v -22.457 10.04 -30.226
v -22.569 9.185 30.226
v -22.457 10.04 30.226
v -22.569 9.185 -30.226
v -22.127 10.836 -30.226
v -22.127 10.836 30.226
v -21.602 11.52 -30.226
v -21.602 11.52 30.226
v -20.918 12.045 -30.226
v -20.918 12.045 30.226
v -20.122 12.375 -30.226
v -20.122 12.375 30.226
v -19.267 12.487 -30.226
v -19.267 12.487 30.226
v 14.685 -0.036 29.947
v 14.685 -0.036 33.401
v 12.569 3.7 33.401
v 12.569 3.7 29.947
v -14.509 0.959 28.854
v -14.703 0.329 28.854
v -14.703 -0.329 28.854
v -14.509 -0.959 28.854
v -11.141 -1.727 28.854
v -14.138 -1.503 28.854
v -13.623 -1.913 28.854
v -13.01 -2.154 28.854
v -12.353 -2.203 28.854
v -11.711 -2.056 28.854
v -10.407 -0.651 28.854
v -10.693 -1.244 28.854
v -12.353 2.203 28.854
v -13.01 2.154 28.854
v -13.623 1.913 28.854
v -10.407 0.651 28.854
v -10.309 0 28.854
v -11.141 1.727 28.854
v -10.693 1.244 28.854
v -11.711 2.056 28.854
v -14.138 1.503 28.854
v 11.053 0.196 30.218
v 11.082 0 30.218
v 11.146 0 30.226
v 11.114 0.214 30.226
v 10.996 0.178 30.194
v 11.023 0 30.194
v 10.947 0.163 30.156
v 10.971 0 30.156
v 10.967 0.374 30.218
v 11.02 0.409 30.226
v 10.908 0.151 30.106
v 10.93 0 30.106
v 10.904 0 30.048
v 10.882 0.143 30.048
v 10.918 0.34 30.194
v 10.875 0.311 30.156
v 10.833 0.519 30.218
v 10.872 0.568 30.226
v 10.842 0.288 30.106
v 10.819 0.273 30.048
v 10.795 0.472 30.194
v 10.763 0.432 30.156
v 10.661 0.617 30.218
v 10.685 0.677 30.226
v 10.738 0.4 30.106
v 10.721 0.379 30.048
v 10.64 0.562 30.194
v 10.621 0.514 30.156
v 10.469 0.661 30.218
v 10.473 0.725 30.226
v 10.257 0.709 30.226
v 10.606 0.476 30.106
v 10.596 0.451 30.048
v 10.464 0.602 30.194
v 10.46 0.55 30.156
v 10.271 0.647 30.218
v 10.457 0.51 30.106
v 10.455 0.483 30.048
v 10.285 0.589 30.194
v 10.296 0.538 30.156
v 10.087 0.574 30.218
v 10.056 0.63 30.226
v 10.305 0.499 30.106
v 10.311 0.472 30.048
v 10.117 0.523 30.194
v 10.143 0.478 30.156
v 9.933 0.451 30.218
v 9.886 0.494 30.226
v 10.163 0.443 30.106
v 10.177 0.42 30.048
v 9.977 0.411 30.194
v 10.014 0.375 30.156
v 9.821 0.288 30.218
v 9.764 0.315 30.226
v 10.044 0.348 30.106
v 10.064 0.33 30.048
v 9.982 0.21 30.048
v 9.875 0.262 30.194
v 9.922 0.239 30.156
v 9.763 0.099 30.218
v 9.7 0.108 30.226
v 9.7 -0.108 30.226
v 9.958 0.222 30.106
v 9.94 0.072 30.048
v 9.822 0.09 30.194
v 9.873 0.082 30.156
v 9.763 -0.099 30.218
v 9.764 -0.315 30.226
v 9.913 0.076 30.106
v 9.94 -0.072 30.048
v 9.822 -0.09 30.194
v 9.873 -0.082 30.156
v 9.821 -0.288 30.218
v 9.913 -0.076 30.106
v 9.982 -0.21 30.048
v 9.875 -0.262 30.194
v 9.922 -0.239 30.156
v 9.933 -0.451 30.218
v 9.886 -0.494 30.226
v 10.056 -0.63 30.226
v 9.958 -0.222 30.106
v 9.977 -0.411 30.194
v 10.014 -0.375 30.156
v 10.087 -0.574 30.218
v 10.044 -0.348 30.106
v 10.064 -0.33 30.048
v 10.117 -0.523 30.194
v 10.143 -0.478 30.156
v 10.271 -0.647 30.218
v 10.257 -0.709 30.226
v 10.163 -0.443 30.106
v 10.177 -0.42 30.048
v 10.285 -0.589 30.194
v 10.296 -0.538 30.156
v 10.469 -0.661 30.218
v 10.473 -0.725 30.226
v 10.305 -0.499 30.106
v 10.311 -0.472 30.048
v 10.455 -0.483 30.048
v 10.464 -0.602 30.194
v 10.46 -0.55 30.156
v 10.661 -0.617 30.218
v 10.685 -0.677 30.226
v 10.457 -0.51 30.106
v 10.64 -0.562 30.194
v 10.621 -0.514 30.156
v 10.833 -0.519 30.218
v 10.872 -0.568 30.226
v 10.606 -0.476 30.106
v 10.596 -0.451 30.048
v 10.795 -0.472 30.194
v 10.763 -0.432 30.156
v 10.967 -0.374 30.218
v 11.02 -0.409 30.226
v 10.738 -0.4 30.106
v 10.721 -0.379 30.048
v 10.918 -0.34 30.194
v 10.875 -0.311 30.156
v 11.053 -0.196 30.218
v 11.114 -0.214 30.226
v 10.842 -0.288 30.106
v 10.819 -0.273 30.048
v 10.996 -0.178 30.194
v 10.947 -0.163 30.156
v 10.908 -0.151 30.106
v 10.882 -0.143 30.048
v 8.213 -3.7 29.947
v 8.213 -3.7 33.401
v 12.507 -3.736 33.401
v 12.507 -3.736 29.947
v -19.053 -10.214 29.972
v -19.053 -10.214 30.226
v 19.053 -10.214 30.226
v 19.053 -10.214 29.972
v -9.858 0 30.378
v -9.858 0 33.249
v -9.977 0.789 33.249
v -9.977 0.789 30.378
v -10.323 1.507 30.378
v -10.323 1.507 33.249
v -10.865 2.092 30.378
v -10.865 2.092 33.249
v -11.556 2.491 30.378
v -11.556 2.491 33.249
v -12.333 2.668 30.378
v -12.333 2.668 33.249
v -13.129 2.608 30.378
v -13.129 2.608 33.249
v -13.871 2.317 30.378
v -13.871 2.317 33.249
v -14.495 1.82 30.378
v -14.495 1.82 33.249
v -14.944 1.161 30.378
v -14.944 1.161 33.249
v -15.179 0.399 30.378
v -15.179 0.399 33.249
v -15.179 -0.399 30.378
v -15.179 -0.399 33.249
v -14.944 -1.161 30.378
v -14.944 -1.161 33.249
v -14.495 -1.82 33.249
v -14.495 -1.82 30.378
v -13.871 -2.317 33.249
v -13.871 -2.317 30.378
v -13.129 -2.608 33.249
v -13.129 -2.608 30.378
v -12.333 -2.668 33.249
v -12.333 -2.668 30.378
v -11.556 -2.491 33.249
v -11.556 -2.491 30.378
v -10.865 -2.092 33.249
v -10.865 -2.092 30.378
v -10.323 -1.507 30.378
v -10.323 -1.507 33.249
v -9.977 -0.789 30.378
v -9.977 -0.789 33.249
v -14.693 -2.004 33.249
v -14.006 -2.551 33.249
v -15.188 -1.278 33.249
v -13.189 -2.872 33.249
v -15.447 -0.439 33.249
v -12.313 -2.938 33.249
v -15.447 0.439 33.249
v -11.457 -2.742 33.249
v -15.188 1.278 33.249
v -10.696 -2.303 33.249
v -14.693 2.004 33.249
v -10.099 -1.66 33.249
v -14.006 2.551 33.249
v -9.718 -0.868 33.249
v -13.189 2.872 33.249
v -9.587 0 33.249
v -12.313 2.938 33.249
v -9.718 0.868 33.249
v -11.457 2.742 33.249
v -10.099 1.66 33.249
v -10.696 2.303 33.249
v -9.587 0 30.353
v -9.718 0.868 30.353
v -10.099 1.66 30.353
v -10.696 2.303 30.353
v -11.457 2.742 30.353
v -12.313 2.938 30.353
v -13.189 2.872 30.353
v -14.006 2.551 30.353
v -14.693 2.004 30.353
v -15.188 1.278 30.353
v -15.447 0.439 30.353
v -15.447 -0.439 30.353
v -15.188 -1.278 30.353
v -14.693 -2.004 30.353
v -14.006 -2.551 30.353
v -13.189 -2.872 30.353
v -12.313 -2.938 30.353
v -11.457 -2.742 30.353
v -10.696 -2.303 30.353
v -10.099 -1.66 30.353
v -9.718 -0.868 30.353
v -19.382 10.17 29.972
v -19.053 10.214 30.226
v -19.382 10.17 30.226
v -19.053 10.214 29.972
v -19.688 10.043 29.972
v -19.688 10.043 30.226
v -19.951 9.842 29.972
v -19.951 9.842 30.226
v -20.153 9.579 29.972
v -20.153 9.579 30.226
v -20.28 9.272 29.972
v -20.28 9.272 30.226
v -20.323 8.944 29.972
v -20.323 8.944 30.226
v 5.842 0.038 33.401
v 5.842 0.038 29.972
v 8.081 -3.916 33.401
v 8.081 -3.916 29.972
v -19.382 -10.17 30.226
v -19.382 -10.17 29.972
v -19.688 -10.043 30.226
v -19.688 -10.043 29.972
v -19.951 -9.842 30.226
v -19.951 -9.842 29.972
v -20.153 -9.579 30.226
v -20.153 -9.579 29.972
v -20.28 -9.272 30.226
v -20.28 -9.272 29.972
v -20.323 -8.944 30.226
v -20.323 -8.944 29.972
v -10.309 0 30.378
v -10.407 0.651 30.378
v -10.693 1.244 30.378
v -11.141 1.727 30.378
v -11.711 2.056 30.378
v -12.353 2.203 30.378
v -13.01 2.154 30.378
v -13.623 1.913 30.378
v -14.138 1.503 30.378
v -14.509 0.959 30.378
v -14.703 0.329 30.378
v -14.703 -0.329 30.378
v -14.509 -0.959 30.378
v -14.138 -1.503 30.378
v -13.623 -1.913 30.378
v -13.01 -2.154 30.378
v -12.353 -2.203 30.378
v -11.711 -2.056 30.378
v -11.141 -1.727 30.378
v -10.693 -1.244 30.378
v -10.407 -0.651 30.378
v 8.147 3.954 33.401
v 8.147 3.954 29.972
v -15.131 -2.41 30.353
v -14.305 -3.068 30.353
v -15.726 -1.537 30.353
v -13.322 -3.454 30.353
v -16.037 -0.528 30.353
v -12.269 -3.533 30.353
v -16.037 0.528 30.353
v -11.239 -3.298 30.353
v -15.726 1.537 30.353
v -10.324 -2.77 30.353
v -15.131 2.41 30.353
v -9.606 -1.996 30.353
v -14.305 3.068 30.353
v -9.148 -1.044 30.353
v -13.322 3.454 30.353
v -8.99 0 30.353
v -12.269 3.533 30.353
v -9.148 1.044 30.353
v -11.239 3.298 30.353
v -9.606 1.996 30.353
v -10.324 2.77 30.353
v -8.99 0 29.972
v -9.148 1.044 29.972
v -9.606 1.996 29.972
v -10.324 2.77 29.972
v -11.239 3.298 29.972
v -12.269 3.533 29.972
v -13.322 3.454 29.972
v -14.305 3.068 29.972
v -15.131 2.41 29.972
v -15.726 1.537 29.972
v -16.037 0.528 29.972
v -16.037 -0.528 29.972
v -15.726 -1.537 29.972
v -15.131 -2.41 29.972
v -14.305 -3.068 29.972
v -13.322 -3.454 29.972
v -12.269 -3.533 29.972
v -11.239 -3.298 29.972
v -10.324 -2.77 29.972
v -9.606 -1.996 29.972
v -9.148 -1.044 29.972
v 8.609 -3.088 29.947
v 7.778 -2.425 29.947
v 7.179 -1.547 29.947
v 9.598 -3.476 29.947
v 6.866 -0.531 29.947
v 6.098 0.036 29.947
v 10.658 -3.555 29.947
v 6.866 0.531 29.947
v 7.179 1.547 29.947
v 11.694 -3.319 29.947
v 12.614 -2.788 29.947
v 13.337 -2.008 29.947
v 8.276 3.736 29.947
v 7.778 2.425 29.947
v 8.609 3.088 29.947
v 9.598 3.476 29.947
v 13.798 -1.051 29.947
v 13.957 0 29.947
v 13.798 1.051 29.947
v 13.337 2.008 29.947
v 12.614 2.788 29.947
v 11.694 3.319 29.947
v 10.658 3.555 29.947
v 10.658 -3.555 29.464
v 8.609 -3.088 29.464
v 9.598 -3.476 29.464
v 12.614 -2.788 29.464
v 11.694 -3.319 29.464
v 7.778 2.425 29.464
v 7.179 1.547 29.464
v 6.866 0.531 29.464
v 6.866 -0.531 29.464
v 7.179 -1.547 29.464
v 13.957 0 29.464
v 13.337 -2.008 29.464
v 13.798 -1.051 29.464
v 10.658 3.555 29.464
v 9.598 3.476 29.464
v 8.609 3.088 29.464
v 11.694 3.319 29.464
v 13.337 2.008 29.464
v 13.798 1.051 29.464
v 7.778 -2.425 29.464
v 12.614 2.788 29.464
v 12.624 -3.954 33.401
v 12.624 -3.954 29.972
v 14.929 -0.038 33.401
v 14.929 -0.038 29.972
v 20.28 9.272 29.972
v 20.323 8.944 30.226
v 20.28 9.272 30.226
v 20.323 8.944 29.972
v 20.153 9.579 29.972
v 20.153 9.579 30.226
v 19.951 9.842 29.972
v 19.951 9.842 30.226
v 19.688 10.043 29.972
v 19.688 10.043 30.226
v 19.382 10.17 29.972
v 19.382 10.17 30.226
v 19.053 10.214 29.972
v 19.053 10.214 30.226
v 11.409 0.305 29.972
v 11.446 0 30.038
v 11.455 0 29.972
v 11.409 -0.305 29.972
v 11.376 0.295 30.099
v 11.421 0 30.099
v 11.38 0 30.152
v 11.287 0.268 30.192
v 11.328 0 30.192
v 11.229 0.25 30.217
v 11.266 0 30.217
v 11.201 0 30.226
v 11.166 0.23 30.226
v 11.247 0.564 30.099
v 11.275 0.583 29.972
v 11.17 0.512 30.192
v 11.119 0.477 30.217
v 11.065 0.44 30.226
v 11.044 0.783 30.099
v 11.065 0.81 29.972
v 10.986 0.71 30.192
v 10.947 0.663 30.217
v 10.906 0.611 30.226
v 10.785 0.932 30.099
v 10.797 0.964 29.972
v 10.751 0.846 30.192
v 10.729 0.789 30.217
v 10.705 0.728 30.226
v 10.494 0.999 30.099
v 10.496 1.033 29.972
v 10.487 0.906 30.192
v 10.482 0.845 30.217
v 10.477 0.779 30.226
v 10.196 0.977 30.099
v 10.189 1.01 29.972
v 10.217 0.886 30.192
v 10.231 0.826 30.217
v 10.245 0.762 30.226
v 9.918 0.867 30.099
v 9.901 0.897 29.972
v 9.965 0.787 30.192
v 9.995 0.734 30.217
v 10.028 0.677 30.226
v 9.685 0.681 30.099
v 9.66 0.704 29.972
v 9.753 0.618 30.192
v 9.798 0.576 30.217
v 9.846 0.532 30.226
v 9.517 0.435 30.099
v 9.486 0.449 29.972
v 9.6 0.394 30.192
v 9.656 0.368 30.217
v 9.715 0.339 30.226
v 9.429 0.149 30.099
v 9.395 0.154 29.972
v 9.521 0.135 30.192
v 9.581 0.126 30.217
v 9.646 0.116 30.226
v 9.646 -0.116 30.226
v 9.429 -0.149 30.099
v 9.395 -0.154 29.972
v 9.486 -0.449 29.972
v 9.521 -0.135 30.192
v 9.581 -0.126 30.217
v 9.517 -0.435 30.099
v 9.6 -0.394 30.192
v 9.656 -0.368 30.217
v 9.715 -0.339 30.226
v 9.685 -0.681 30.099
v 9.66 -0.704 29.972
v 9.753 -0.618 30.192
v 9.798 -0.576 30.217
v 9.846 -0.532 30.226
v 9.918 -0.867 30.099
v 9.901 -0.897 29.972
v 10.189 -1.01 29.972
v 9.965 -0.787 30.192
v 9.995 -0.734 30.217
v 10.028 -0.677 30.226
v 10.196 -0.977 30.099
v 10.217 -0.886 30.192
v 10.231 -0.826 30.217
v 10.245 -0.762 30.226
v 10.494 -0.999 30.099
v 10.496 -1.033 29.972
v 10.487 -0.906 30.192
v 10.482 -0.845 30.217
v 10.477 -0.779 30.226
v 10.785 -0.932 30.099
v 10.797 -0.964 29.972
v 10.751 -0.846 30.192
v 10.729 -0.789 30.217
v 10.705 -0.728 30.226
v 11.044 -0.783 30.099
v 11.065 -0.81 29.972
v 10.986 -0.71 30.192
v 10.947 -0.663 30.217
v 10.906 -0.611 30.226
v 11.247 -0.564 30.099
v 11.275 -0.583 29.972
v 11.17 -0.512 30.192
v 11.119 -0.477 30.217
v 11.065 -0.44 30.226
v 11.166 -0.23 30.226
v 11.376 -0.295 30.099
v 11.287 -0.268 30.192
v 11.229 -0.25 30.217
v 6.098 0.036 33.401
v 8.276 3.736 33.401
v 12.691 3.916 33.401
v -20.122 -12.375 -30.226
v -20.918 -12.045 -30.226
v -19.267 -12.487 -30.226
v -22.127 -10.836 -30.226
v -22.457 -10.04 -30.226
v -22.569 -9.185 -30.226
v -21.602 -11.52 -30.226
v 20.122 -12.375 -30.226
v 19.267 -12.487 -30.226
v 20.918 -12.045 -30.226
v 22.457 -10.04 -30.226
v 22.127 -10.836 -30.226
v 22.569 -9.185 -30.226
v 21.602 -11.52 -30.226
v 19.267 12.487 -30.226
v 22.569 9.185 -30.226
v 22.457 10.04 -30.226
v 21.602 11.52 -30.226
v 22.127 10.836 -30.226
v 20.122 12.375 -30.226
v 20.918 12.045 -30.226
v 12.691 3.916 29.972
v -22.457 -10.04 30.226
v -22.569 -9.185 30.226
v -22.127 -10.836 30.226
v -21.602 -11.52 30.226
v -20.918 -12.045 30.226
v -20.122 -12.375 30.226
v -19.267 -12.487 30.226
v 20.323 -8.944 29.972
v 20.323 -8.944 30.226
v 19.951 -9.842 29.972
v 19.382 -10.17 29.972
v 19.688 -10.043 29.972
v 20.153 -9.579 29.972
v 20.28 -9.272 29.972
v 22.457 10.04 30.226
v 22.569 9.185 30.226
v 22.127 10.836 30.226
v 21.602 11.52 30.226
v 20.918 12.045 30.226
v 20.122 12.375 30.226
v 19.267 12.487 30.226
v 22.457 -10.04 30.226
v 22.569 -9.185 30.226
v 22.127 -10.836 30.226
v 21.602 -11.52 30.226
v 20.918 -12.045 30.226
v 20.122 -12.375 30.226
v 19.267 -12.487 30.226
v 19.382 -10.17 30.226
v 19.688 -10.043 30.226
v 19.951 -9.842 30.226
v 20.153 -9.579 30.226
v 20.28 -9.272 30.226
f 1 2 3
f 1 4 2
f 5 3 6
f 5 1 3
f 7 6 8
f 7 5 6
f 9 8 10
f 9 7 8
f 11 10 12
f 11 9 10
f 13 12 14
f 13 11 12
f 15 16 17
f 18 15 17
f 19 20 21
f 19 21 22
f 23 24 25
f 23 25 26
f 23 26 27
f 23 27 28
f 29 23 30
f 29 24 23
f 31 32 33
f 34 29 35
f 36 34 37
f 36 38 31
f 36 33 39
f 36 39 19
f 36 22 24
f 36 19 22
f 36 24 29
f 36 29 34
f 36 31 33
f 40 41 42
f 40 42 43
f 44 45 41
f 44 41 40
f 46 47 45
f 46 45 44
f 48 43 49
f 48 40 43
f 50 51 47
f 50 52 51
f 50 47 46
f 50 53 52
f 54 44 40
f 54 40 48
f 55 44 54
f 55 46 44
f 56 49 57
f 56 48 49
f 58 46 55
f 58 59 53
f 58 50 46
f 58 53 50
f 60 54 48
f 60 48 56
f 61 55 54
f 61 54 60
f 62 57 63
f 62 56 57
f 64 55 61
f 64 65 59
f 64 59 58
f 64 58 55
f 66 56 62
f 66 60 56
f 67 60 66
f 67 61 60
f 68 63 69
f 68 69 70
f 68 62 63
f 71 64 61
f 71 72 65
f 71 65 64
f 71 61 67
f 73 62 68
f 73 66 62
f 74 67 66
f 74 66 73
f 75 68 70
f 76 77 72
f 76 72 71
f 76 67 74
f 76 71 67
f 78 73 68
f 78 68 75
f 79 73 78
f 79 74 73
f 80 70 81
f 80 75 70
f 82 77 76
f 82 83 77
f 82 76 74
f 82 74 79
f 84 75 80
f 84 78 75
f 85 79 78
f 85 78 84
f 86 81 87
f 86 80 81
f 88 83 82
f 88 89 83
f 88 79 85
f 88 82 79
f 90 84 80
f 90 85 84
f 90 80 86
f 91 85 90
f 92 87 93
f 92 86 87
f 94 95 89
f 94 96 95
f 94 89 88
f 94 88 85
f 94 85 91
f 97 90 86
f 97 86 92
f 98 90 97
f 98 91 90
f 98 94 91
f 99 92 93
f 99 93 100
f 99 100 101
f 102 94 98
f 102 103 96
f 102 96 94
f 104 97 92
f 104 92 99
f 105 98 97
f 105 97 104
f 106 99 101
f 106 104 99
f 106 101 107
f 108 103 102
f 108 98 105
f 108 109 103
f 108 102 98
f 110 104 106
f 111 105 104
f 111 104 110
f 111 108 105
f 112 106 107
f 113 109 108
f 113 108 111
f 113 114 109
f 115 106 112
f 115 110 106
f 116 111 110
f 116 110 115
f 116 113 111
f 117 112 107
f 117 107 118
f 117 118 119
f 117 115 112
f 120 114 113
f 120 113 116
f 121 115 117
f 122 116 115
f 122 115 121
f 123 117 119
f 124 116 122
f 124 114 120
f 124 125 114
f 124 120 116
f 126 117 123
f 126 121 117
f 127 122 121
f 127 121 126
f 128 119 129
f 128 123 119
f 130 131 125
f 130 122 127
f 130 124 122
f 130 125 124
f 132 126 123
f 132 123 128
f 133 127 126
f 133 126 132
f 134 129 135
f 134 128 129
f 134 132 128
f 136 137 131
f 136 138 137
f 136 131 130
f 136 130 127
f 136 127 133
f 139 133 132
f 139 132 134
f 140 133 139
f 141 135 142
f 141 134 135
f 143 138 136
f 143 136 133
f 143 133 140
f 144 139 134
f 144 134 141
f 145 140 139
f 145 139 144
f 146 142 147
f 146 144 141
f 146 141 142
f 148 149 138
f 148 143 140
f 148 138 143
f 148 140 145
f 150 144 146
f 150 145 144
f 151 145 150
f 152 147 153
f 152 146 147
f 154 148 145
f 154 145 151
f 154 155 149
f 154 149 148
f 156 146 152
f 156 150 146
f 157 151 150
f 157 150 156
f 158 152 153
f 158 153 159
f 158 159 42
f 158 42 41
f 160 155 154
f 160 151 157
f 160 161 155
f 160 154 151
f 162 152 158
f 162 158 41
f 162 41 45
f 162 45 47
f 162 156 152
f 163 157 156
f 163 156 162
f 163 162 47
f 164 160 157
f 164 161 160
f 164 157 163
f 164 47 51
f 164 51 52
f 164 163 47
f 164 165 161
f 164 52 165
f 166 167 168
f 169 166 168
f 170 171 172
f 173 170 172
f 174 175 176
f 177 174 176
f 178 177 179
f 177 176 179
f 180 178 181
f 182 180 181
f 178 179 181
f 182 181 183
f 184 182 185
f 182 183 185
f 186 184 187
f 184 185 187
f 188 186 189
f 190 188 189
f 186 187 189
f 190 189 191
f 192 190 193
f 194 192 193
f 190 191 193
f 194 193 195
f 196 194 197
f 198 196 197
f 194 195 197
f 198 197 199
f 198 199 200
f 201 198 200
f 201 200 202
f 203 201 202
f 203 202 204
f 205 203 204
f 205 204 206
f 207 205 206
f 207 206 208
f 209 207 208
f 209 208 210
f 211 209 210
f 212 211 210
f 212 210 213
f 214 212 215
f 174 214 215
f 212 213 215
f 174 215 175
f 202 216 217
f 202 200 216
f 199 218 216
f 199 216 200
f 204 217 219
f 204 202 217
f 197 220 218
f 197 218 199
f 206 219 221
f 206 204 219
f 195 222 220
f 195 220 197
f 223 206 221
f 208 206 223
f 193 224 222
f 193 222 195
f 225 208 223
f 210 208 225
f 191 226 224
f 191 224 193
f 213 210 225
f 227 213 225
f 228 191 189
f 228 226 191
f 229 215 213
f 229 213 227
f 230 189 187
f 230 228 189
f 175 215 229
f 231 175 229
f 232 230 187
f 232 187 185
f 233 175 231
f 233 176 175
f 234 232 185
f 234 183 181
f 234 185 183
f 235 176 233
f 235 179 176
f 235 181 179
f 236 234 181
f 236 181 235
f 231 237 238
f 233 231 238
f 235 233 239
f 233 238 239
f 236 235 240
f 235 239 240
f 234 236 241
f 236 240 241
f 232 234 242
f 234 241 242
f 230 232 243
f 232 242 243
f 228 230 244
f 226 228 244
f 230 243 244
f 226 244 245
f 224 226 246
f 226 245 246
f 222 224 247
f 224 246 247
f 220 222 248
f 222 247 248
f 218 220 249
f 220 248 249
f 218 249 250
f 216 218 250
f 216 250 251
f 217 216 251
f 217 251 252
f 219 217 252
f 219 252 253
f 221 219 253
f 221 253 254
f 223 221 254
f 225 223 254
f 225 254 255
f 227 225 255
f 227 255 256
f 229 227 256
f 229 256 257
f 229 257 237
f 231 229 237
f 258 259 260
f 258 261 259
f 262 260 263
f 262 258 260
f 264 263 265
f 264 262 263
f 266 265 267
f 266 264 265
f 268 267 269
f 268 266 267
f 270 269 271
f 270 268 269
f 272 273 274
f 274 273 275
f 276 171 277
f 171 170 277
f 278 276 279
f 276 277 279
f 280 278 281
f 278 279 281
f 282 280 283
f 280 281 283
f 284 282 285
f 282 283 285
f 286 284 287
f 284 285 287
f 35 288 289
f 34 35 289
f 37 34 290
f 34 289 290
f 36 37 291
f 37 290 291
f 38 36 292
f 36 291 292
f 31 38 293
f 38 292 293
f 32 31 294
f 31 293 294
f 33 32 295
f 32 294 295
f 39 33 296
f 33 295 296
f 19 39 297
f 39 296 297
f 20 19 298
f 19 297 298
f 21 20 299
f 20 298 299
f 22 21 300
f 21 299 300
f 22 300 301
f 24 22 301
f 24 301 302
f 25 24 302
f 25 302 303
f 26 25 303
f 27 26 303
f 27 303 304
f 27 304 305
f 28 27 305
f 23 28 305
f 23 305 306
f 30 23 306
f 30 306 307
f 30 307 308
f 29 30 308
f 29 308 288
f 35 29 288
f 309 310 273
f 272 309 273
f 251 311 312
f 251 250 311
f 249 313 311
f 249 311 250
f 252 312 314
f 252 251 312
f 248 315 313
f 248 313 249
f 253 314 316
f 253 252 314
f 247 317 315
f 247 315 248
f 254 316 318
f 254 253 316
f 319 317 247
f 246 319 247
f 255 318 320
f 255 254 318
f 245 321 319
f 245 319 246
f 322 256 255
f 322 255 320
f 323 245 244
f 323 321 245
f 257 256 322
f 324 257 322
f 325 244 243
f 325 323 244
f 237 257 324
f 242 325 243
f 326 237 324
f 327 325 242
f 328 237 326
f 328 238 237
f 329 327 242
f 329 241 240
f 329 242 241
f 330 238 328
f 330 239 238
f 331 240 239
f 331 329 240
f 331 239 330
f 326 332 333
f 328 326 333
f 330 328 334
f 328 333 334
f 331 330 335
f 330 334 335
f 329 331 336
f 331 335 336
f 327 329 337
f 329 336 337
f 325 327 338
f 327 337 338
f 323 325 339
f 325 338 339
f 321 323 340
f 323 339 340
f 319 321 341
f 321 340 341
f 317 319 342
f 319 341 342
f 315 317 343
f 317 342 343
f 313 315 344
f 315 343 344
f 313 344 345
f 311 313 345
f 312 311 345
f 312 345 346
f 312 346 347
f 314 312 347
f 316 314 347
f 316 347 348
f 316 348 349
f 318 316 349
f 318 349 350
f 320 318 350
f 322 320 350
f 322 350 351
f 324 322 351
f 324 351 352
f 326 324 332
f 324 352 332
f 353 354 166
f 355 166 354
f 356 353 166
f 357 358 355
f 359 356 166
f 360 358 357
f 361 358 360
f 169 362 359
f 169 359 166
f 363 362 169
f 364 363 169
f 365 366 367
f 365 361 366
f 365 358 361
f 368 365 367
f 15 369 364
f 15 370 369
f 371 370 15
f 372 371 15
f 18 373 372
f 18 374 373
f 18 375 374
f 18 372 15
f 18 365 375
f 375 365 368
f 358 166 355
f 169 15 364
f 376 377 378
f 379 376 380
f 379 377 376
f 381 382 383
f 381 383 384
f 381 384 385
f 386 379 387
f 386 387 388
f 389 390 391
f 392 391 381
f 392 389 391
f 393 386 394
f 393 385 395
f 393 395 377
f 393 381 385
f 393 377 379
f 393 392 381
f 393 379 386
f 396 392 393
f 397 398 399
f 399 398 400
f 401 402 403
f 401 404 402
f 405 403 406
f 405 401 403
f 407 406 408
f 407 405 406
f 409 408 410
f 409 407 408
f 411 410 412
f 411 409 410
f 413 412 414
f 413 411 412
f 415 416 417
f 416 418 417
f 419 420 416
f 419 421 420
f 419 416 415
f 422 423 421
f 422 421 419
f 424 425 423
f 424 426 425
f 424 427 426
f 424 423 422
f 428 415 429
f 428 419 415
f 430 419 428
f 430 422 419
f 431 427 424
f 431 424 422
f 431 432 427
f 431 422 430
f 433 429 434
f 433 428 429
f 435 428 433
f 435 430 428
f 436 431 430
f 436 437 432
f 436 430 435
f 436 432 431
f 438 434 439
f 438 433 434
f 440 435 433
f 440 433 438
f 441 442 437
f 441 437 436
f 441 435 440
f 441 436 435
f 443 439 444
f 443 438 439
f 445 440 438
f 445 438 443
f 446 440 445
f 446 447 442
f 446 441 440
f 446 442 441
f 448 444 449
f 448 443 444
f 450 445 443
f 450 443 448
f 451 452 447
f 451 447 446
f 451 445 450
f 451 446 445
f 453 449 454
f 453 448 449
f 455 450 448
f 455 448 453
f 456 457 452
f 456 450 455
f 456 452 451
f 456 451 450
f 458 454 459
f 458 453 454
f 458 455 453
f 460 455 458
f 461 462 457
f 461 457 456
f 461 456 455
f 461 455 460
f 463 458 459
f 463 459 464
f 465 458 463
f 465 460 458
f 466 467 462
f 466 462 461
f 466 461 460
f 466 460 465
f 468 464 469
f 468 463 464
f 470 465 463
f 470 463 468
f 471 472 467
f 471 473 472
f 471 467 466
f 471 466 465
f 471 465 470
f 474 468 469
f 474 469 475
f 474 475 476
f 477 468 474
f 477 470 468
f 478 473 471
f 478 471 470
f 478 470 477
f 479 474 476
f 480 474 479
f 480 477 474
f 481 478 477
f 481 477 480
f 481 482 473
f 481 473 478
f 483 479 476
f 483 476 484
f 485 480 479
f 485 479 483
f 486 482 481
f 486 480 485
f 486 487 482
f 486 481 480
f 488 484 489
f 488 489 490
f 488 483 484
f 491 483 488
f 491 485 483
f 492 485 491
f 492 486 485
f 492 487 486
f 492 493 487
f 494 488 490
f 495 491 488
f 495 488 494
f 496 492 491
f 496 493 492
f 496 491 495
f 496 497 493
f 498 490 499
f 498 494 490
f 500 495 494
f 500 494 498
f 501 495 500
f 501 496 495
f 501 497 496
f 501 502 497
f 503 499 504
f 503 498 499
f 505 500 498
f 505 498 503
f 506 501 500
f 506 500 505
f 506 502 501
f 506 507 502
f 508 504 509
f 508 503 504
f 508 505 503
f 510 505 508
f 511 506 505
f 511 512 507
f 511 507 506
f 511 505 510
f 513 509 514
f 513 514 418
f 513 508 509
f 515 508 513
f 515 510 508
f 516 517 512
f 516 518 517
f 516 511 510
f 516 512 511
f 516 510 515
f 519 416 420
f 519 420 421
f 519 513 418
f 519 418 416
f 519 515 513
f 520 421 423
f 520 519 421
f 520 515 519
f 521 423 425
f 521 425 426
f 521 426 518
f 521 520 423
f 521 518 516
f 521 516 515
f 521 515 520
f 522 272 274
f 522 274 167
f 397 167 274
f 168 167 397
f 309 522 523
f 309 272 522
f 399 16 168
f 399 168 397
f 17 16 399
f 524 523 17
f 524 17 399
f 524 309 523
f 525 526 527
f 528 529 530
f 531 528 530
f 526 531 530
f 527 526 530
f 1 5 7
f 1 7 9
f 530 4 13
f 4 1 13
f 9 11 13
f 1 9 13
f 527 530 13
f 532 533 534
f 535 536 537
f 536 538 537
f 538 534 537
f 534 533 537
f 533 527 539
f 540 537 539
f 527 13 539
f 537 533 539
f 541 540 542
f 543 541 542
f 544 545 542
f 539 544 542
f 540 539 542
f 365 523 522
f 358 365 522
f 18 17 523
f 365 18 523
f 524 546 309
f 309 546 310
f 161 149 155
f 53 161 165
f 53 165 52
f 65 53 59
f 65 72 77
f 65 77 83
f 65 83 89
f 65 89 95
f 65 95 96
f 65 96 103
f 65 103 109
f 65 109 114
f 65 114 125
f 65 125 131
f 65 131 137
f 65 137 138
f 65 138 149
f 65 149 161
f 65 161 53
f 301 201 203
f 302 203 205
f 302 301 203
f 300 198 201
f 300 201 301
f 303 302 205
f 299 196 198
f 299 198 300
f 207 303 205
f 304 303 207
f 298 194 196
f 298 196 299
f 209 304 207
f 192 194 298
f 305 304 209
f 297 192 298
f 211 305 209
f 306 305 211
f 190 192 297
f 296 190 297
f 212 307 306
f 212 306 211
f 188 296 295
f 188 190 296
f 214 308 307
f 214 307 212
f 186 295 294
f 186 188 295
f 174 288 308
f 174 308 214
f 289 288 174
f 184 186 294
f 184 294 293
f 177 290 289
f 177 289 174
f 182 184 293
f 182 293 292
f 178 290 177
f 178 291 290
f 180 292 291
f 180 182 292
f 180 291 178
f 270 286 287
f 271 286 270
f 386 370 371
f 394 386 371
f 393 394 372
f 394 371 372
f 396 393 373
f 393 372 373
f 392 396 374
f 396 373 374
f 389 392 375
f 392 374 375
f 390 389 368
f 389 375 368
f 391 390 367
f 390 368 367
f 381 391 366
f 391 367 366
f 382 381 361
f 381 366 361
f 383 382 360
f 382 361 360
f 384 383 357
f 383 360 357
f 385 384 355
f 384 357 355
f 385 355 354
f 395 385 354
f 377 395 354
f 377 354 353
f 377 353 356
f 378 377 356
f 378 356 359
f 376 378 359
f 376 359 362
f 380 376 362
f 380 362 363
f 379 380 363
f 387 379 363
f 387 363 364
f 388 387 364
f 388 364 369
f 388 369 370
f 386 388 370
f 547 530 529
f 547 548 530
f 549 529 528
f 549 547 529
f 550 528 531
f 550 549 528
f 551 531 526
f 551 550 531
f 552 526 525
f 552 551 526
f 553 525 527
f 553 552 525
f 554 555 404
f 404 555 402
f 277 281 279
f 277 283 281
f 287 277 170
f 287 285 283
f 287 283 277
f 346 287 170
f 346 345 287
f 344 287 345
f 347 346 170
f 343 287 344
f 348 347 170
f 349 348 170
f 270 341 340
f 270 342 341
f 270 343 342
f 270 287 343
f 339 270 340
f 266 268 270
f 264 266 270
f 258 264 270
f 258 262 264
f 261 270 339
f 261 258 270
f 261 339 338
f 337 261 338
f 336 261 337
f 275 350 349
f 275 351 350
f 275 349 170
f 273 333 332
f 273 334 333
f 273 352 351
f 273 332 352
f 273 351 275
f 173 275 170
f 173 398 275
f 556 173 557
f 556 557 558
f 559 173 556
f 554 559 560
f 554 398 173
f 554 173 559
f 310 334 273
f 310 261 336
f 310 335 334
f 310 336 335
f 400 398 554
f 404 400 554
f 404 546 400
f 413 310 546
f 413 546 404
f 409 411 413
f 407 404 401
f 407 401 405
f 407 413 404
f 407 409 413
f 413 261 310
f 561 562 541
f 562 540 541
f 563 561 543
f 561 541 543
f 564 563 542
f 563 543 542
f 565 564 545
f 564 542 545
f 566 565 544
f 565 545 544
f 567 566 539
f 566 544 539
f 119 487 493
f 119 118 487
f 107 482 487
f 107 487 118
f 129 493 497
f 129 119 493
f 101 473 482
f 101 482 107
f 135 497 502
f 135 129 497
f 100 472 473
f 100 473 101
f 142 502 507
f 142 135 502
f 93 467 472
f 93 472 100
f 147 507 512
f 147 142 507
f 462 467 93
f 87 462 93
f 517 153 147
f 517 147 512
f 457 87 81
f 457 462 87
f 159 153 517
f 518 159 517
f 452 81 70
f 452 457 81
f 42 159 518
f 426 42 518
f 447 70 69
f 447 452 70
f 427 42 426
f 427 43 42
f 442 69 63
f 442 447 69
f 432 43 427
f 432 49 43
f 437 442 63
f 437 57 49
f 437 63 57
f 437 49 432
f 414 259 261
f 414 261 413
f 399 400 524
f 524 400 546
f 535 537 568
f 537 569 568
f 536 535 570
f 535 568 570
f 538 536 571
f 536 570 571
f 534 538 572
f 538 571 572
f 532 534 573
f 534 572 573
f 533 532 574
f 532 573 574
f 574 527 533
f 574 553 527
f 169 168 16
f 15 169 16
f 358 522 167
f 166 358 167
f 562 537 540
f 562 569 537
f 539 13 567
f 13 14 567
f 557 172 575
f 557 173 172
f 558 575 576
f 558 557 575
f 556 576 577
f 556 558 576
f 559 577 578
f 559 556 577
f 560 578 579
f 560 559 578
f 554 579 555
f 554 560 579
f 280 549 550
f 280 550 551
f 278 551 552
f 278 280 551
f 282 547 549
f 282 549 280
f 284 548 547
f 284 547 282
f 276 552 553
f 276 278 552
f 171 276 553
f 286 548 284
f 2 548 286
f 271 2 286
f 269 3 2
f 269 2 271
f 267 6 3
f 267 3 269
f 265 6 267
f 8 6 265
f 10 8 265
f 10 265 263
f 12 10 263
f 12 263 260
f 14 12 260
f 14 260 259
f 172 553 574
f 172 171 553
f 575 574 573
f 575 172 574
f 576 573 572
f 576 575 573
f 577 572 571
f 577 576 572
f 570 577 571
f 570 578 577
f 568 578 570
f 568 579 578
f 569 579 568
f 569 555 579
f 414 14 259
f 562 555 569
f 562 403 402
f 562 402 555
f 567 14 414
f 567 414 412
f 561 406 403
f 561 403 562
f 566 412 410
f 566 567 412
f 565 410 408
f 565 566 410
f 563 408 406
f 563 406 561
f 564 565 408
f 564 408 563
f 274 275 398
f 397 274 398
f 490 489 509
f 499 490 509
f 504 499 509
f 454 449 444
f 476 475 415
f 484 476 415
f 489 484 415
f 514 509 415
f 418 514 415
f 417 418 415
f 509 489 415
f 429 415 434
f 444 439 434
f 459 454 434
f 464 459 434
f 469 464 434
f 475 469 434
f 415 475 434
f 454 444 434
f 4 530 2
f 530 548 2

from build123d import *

# Parameters (mm, degrees)
F0_W      = 45.1385900378
F0_H      = 24.9742213637
F1_DEPTH  = 30.226
F2_R      = 3.302
F3_W      = 40.6467653811
F3_H      = 20.4270016402
F4_DEPTH  = 0.254
F5_R      = 1.27
F6_R      = 2.9461453385
F7_DEPTH  = 3.2766
F6_R_2    = 3.5430744691
F8_DEPTH  = 0.381
F9_DEPTH  = 3.429
F11_DEPTH = 3.4544
F12_R     = 3.565401554
F13_DEPTH = 0.508
F14_R     = 0.4846078425
F15_DEPTH = 0.0762
F14_R_2   = 1.0356451119
F16_DEPTH = 0.254
F18_R     = 2.6755593281
F18_R_2   = 0.8351552506
F19_DEPTH = 2.8702
F20_R     = 2.2091463804
F21_DEPTH = 4.3942


# Not quite as in the source:
# - a fillet or chamfer that OpenCascade refuses, or shapes differently, is made with other operations: its cross-section is extruded or revolved along the edge and cut away or added


with BuildPart() as f1:
    # F0 (on Top) → F1 (new body, symmetric)
    with BuildSketch(Plane.XY):
        Rectangle(F0_W, F0_H)
    extrude(amount=F1_DEPTH, both=True)

    # F2
    f2_edges = [f1.edges().sort_by_distance(p)[0] for p in [
        (-22.569295, -12.487111, 0),
        (-22.569295, 12.487111, 0),
        (22.569295, -12.487111, 0),
        (22.569295, 12.487111, 0),
    ]]
    fillet(f2_edges, radius=F2_R)

    # F3 (on face) → F4 (cut)
    with BuildSketch(Plane.XY.offset(30.226)):
        Rectangle(F3_W, F3_H)
    extrude(amount=-F4_DEPTH, mode=Mode.SUBTRACT)

    # F5
    f5_edges = [f1.edges().sort_by_distance(p)[0] for p in [
        (-20.323383, 10.213501, 30.099),
        (-20.323383, -10.213501, 30.099),
        (20.323383, 10.213501, 30.099),
        (20.323383, -10.213501, 30.099),
    ]]
    fillet(f5_edges, radius=F5_R)

    # F6 (on face) → F7 (join)
    with BuildSketch(Plane.XY.offset(29.972)):
        with Locations((-12.5333582982, 0)):
            Circle(F6_R)
    extrude(amount=F7_DEPTH)

    # F6 (on face) → F8 (join)
    with BuildSketch(Plane.XY.offset(29.972)):
        with Locations((-12.5333582982, 0)):
            Circle(F6_R_2)
        with Locations((-12.5333582982, 0)):
            Circle(F6_R, mode=Mode.SUBTRACT)
    extrude(amount=F8_DEPTH)

    # F6 (on face) → F9 (join)
    with BuildSketch(Plane.XY.offset(29.972)):
        Polygon((12.6905003563, 3.9159879088), (8.1466763174, 3.9541461872), (5.8417182595, 0.0381582783), (8.0805842406, -3.9159879088), (12.6244082795, -3.9541461872), (14.9293663373, -0.0381582783), align=None)
    extrude(amount=F9_DEPTH)

    # F10 (on face) → F11 (cut)
    with BuildSketch(Plane.XY.offset(33.401)):
        Polygon((12.5692944355, 3.700253209), (8.275793058, 3.7363093193), (6.0978168617, 0.0360561103), (8.213342043, -3.700253209), (12.5068434206, -3.7363093193), (14.6848196168, -0.0360561103), align=None)
    extrude(amount=-F11_DEPTH, mode=Mode.SUBTRACT)

    # F12 (on face) → F13 (cut)
    with BuildSketch(Plane.XY.offset(29.972)):
        with Locations((10.3914178908, 0)):
            Circle(F12_R)
    extrude(amount=-F13_DEPTH, mode=Mode.SUBTRACT)

    # F18 (on face) → F19 (cut)
    with BuildSketch(Plane.XY.offset(33.2486)):
        with Locations((-12.5333582982, 0)):
            Circle(F18_R)
        with Locations((-12.5333582982, 0)):
            Circle(F18_R_2, mode=Mode.SUBTRACT)
    extrude(amount=-F19_DEPTH, mode=Mode.SUBTRACT)

    # F20 (on face) → F21 (cut)
    with BuildSketch(Plane.XY.offset(33.2486)):
        with Locations((-12.5184208155, 0)):
            Circle(F20_R)
    extrude(amount=-F21_DEPTH, mode=Mode.SUBTRACT)


with BuildPart() as f15:
    # F14 (on face) → F15 (new body)
    with BuildSketch(Plane.XY.offset(29.972)):
        with Locations((10.4190623388, 0)):
            Circle(F14_R)
    extrude(amount=F15_DEPTH)

    # F14 (on face) → F16 (join)
    with BuildSketch(Plane.XY.offset(29.972)):
        with Locations((10.4190623388, 0)):
            Circle(F14_R_2)
        with Locations((10.4190623388, 0)):
            Circle(F14_R, mode=Mode.SUBTRACT)
    extrude(amount=F16_DEPTH)

    # F17: fillet of radius 0.254 on 2 edges, made by hand

    # F17_s1 → F17_t2 (revolve, cut)
    with BuildSketch(Plane.XZ):
        with BuildLine():
            ThreePointArc((11.4547074506, 29.972), (11.380312573, 30.1516051224), (11.2007074506, 30.226))
            Line((11.2007074506, 30.226), (11.4547074506, 30.226))
            Line((11.4547074506, 30.226), (11.4547074506, 29.972))
        make_face()
    revolve(axis=Axis((10.4190623388, 0, 30.226), (0, 0, 1)), mode=Mode.SUBTRACT)

    # F17_s3 → F17_t4 (revolve, cut)
    with BuildSketch(Plane.XZ):
        with BuildLine():
            ThreePointArc((11.1459707384, 30.226), (10.9957023119, 30.1767813468), (10.9036701812, 30.0482))
            Line((10.9036701812, 30.0482), (10.9036701812, 30.226))
            Line((10.9036701812, 30.226), (11.1459707384, 30.226))
        make_face()
    revolve(axis=Axis((10.4190623388, 0, 30.226), (0, 0, 1)), mode=Mode.SUBTRACT)


solid = Compound([f1.part, f15.part])
